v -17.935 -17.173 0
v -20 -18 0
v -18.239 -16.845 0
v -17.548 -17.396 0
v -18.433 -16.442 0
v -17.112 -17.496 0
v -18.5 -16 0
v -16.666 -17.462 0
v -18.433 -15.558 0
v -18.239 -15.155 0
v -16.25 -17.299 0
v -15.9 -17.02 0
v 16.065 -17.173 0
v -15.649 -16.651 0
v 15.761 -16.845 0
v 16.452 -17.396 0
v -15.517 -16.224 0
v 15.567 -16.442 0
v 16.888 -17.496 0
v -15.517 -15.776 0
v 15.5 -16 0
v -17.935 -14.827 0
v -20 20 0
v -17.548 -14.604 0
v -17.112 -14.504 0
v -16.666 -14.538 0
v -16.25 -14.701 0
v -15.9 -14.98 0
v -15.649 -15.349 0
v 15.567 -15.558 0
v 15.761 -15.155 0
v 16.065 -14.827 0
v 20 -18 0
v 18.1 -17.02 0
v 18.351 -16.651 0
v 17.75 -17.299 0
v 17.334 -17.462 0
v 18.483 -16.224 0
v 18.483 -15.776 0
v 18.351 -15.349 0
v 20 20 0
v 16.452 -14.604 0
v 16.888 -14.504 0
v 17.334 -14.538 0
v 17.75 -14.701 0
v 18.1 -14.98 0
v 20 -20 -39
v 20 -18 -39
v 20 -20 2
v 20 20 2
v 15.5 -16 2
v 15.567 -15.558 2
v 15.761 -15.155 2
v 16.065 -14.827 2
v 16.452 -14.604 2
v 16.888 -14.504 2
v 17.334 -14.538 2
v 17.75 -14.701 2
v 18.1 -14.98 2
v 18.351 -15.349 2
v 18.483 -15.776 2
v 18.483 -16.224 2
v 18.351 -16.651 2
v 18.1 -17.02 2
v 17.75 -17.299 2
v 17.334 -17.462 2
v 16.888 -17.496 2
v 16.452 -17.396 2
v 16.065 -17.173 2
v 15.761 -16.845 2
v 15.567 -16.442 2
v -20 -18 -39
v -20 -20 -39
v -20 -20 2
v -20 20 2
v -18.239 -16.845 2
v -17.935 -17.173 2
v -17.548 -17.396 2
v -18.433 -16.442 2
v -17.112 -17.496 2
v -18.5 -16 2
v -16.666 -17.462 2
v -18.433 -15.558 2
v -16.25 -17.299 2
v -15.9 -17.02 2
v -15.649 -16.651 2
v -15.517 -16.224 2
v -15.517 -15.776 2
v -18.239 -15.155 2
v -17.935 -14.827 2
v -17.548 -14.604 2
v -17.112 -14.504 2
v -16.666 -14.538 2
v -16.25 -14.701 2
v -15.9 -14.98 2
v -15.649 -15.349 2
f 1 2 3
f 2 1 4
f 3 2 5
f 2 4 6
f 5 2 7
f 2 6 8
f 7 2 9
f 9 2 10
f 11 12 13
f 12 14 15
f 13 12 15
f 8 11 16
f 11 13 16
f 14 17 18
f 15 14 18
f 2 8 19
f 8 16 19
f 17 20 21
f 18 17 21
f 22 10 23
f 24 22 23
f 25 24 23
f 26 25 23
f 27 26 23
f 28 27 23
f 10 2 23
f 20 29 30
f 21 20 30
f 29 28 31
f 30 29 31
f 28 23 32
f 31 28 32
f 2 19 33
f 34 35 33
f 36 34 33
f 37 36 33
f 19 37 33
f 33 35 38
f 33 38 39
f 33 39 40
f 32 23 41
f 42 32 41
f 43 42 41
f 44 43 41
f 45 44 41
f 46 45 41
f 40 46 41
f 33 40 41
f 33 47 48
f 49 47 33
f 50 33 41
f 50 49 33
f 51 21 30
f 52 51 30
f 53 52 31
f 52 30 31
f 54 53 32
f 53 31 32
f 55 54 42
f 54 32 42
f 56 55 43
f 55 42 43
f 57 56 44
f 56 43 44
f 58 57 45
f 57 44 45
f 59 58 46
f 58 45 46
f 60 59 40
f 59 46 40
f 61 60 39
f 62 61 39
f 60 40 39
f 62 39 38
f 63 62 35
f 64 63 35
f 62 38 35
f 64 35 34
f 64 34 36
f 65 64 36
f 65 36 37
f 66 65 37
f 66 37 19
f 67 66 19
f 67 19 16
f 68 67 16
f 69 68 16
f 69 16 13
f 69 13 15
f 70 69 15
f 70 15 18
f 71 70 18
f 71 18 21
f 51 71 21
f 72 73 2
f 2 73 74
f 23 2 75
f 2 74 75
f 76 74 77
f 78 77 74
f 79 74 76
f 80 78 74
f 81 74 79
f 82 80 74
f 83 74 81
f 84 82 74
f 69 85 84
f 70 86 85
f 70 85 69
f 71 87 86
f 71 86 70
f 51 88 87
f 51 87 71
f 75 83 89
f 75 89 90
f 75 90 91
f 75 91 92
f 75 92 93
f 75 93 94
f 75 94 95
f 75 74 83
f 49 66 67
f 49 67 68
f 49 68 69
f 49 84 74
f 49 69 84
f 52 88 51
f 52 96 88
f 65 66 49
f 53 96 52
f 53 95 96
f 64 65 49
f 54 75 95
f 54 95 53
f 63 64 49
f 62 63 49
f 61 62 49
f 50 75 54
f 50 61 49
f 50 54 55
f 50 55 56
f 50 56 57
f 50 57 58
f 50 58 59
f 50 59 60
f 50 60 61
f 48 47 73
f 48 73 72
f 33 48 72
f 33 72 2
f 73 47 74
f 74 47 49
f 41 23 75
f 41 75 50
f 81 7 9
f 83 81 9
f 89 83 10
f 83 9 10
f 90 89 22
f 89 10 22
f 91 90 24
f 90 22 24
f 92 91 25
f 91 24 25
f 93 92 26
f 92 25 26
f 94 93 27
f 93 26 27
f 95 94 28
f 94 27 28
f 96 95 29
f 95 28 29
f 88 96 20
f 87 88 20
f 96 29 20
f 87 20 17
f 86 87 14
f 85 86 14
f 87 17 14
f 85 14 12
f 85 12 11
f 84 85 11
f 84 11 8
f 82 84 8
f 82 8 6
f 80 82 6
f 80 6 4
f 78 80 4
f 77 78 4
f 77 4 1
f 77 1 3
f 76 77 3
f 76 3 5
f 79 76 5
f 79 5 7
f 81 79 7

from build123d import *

# Parameters (mm, degrees)
F0_W          = 40
F0_H          = 40
F1_DEPTH      = 2
F2_W          = 2
F2_H          = 39
F3_DEPTH      = 20
F3_DEPTH_BACK = 20
F5_D          = 3


with BuildPart() as f1:
    # F0 (on Top) → F1 (new body)
    with BuildSketch(Plane.XY):
        Rectangle(F0_W, F0_H)
    extrude(amount=F1_DEPTH)

    # F2 (on Right) → F3 (join, two sides)
    with BuildSketch(Plane.YZ) as f3_sk:
        with Locations((-19, -19.5)):
            Rectangle(F2_W, F2_H)
    extrude(amount=F3_DEPTH)
    extrude(f3_sk.sketch, amount=-F3_DEPTH_BACK)

    # F5 (through all)
    with Locations(Plane.XY.offset(2)):
        with Locations((-17, -16), (17, -16)):
            Hole(F5_D / 2)


solid = f1.part
